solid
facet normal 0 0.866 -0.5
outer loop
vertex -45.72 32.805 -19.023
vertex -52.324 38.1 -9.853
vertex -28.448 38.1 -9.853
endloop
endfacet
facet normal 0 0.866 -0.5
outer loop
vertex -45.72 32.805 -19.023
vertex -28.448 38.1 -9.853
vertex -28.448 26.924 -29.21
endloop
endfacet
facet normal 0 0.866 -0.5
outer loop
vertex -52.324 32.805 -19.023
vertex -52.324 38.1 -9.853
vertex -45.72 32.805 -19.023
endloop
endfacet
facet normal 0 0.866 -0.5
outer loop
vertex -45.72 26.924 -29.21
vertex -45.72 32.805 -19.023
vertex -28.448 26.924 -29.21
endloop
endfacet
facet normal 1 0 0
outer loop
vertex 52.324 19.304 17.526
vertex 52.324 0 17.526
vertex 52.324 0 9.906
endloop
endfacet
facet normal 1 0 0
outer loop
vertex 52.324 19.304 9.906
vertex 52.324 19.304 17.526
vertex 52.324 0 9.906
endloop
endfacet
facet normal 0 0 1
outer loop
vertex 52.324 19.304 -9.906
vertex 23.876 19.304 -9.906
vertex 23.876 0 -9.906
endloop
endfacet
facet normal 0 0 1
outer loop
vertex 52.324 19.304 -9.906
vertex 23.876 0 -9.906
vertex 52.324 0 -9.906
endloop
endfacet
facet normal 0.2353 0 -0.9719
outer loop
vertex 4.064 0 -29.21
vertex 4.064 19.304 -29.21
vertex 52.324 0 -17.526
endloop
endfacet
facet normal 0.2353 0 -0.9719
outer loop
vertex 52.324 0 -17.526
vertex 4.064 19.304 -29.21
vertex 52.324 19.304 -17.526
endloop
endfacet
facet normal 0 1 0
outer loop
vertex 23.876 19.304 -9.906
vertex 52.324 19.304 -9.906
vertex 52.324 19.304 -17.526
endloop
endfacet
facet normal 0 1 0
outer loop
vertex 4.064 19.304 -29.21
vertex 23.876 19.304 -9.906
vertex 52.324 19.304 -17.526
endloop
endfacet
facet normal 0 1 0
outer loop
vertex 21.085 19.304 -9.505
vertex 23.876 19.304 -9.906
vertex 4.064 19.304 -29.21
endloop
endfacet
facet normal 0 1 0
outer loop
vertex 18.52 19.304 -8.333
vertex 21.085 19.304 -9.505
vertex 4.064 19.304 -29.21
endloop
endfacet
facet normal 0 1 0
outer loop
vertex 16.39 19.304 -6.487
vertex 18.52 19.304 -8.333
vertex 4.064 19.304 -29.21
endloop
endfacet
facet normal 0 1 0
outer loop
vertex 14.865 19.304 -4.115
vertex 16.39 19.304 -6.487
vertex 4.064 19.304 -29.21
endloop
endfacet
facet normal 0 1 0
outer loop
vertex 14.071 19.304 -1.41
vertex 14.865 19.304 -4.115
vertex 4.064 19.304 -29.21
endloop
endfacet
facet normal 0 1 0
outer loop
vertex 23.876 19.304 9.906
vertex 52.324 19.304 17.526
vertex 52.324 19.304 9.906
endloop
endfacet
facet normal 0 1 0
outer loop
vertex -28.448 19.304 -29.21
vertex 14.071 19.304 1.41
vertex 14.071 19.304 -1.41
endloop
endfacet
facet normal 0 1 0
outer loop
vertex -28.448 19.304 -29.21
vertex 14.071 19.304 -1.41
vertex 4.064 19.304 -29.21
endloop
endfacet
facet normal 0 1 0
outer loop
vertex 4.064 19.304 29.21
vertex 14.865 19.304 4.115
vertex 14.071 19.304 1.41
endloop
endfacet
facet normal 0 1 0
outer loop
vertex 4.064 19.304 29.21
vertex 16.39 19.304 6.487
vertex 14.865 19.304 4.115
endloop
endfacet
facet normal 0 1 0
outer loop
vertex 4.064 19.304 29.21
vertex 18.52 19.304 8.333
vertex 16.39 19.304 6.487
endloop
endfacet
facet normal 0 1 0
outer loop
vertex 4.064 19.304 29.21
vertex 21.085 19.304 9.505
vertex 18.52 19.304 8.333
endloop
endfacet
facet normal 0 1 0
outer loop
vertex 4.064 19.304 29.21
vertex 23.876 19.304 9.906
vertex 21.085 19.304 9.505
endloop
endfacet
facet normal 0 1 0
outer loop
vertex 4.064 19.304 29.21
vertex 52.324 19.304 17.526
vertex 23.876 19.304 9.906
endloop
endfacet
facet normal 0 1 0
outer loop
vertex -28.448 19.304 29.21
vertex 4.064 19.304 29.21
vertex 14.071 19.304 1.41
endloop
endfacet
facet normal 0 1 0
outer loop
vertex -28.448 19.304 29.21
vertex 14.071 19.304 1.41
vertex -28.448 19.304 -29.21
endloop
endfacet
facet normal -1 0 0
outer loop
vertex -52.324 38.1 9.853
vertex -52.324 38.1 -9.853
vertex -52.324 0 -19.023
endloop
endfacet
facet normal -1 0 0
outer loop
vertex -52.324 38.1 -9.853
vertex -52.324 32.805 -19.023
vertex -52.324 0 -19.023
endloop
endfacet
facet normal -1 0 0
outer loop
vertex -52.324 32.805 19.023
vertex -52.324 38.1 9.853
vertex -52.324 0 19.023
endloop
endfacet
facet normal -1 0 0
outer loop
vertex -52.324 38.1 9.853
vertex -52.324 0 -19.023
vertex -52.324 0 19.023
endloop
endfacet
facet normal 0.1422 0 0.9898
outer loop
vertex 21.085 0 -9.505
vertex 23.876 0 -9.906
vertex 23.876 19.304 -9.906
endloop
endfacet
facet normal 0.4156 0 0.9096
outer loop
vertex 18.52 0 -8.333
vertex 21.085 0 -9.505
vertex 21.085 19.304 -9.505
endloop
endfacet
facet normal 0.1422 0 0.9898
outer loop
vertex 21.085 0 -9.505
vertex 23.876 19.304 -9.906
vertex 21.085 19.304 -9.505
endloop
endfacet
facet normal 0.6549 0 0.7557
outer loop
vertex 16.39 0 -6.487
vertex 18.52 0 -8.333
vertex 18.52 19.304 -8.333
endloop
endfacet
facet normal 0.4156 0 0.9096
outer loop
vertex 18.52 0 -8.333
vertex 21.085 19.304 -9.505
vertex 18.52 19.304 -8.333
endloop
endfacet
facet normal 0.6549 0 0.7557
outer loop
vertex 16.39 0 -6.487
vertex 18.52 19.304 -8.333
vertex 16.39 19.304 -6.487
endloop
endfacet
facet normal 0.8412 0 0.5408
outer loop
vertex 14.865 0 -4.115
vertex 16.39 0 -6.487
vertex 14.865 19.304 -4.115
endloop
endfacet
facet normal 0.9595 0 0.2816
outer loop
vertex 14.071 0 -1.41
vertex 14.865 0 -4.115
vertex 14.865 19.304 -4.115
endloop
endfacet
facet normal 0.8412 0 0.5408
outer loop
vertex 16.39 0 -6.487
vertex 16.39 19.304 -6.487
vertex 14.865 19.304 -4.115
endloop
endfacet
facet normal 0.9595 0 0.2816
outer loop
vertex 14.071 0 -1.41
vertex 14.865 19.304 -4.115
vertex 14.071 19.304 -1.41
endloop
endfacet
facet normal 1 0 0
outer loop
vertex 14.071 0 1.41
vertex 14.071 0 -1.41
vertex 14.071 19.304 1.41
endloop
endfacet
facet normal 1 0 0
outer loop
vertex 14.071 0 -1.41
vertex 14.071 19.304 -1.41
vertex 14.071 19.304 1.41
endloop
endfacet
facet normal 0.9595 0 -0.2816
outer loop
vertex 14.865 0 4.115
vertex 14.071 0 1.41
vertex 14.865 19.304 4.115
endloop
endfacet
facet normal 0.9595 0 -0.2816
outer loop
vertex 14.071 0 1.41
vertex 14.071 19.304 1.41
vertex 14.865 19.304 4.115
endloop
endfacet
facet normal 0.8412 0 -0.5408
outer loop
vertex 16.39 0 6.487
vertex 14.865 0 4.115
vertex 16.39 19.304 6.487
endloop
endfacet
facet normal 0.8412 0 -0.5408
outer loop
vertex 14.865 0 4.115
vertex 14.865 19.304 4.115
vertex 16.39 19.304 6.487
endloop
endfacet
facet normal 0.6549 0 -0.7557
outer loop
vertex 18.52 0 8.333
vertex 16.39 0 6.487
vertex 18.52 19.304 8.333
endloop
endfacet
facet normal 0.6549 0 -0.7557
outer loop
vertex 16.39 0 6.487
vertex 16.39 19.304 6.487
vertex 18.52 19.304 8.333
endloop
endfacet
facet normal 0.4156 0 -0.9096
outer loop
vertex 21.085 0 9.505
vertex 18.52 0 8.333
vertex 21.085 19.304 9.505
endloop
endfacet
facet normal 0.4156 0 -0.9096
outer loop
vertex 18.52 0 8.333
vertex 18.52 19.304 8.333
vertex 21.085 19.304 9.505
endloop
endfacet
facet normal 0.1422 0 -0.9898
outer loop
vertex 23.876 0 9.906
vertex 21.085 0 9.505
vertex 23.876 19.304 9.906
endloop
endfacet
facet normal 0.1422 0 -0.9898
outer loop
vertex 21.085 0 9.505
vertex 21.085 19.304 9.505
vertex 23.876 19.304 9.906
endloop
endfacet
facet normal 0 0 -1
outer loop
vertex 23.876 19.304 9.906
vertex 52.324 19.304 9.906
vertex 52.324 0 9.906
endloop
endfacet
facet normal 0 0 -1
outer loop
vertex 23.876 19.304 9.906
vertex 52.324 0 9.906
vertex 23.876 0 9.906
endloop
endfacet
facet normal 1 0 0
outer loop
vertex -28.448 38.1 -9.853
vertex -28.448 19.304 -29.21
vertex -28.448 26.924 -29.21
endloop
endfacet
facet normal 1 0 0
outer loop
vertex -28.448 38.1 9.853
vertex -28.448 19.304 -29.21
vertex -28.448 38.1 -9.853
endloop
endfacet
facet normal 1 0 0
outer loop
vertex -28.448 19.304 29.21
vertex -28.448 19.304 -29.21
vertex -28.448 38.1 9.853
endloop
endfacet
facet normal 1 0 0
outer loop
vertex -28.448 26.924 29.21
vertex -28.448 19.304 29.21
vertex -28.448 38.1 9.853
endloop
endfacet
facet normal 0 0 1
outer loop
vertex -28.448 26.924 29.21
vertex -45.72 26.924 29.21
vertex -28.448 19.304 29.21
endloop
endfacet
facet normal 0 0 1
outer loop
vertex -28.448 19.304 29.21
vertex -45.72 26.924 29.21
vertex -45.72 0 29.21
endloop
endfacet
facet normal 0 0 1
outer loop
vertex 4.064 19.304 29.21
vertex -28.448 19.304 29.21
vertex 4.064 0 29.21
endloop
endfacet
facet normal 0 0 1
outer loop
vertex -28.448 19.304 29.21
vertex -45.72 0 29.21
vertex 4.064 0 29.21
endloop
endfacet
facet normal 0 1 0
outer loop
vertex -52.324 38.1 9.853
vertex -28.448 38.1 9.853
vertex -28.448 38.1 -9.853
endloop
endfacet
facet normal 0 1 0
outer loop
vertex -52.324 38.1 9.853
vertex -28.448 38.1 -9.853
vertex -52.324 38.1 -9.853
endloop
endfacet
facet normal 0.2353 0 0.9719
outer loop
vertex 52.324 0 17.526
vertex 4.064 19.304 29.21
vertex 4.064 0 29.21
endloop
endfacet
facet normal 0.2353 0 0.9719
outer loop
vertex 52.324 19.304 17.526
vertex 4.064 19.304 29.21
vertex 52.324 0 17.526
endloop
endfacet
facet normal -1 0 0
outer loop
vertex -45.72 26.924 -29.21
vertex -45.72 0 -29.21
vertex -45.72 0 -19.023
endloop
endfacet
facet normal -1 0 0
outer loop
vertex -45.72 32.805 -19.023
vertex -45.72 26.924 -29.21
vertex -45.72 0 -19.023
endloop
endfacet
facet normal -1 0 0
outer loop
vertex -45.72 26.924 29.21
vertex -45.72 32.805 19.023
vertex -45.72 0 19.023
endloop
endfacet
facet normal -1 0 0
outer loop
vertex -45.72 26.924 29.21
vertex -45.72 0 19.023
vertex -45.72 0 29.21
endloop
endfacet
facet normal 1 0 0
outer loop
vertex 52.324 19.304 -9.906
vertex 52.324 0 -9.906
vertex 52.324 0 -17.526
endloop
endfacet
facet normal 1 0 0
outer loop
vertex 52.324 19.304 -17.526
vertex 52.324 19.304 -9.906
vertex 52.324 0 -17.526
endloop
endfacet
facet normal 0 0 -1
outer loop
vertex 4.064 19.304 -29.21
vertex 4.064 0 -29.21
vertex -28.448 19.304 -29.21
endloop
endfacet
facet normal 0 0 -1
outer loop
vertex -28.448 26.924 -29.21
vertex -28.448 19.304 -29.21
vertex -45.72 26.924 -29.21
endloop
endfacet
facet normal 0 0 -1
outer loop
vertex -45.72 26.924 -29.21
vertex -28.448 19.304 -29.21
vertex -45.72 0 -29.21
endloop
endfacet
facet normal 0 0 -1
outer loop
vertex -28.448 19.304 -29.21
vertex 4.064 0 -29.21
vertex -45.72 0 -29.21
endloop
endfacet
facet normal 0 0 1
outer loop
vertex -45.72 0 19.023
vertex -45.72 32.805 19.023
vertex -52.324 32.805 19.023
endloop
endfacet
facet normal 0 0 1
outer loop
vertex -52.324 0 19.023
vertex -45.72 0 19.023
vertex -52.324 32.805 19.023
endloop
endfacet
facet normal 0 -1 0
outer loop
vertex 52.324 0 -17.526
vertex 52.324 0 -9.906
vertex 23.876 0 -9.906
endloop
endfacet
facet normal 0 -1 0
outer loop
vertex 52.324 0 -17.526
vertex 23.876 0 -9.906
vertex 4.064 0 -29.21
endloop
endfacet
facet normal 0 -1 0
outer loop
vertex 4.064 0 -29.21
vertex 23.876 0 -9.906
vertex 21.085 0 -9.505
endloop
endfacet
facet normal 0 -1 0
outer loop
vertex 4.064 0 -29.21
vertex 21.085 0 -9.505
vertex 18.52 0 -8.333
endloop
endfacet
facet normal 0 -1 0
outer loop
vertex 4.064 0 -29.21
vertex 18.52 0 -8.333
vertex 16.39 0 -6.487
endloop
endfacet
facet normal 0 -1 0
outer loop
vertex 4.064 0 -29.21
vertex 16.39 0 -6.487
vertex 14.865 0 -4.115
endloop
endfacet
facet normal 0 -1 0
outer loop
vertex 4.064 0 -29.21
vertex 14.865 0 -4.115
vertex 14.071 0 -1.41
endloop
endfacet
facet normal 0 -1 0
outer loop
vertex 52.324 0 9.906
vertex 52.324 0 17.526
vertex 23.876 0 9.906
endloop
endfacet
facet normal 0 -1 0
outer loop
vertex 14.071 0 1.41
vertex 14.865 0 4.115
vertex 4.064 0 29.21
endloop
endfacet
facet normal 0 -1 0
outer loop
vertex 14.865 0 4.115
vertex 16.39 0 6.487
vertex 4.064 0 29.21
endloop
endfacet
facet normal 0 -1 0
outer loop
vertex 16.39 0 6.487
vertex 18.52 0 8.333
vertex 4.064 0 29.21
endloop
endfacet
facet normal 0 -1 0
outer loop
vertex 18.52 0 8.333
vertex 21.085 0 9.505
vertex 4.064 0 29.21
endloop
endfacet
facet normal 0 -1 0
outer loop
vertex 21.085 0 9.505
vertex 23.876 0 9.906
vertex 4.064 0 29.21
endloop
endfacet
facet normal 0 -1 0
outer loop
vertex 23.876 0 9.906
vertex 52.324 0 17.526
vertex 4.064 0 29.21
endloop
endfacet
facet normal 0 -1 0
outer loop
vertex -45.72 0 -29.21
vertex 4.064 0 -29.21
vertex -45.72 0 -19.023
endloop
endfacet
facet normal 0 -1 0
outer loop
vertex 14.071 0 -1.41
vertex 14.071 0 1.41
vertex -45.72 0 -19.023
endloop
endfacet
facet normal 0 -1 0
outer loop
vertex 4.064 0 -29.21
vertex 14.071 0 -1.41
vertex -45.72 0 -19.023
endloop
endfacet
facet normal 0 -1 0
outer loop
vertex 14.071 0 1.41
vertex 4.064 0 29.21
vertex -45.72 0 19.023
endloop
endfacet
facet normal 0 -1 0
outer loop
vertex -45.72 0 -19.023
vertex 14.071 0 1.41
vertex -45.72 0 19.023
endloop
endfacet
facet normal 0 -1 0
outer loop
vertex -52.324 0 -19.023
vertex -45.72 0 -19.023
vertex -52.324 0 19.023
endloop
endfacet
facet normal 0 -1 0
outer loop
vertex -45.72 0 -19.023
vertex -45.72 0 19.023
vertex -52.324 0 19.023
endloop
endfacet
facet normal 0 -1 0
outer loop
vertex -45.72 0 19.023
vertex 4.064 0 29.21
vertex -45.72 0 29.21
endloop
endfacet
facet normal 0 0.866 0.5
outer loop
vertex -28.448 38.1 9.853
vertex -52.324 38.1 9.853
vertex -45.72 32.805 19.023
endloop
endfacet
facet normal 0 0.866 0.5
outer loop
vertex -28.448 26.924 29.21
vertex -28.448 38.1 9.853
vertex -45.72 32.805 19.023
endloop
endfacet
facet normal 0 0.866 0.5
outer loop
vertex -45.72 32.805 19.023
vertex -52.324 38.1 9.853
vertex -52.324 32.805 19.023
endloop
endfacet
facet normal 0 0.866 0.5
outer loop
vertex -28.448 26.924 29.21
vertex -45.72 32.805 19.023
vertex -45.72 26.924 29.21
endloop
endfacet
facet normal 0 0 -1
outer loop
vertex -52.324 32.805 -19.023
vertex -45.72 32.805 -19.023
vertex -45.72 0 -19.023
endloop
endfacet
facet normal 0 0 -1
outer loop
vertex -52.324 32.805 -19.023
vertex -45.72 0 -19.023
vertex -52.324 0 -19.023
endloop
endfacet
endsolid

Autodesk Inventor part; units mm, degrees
ref_plane "YZ Plane" through (0, 0, 0) normal (1, 0, 0) x (0, 1, 0)
ref_plane "XZ Plane" through (0, 0, 0) normal (0, 1, 0) x (-1, 0, 0)
ref_plane "XY Plane" through (0, 0, 0) normal (0, 0, 1) x (1, 0, 0)
sketch "Sketch1" plane through (0, 0, 0) normal (0, 1, 0) x (-1, 0, 0)
  line L0 (-52.324, -29.21) -> (52.324, -29.21)
  line L1 (52.324, -29.21) -> (52.324, 29.21)
  line L2 (52.324, 29.21) -> (-52.324, 29.21)
  line L3 (-52.324, 29.21) -> (-52.324, -29.21)
  line L4 (-52.324, -29.21) -> (52.324, 29.21) construction
  line L5 (52.324, -29.21) -> (-52.324, 29.21) construction
  point P0 (0, 0)
  dimension "d0" = 104.648
  dimension "d1" = 58.42
extrude "Extrusion1" add sketch "Sketch1" along normal blind 38.1
sketch "Sketch2" plane through (-52.324, 0, 29.21) normal (0, 0, 1) x (1, 0, 0)
  line L0 (0, 38.1) -> (104.648, 38.1) projected
  line L1 (104.648, 0) -> (104.648, 38.1) projected
  line L2 (23.876, 38.1) -> (104.648, 38.1)
  line L3 (104.648, 38.1) -> (104.648, 19.304)
  line L4 (104.648, 19.304) -> (23.876, 19.304)
  line L5 (23.876, 19.304) -> (23.876, 38.1)
  line L6 (0, 0) -> (0, 38.1) projected
  line L7 (0, 0) -> (104.648, 0) projected
  point P0 (52.324, 0)
  dimension "d4" = 23.876
  dimension "d5" = 19.304
extrude "Extrusion2" cut sketch "Sketch2" against normal through all contours L0 L1 L4 L5
sketch "Sketch3" plane through (-52.324, 0, -29.21) normal (-1, 0, 0) x (0, 0, 1)
  line L0 (0, 38.1) -> (58.42, 38.1) projected
  line L1 (39.0626, 38.1) -> (58.42, 26.924)
  line L2 (58.42, 0) -> (58.42, 38.1) projected
  point P0 (29.21, 0)
  dimension "d8" = 11.176
  dimension "d9" = 30
extrude "Extrusion3" cut sketch "Sketch3" against normal through all
sketch "Sketch4" plane through (-52.324, 0, -29.21) normal (-1, 0, 0) x (0, 0, 1)
  line L0 (0, 38.1) -> (39.0626, 38.1) projected
  line L1 (19.3574, 38.1) -> (0, 26.924)
  line L2 (0, 38.1) -> (0, 19.304) projected
  point P0 (29.21, 0)
  dimension "d12" = 11.176
  dimension "d13" = 30
extrude "Extrusion4" cut sketch "Sketch4" against normal through all
sketch "Sketch5" plane through (-28.448, 19.304, 29.21) normal (0, 1, 0) x (1, 0, 0)
  line L0 (80.772, 0) -> (0, 0) projected
  line L1 (32.512, 0) -> (80.772, 11.684)
  line L2 (80.772, 58.42) -> (80.772, 0) projected
  point P0 (28.448, 29.21)
  dimension "d16" = 48.26
  dimension "d17" = 11.684
extrude "Extrusion5" cut sketch "Sketch5" against normal through all
sketch "Sketch6" plane through (-28.448, 19.304, -29.21) normal (0, 1, 0) x (1, 0, 0)
  line L0 (80.772, 0) -> (-23.876, 0) projected
  line L1 (32.512, 0) -> (80.772, -11.684)
  line L2 (80.772, 0) -> (80.772, -46.736) projected
  point P0 (28.448, -29.21)
  dimension "d20" = 11.684
  dimension "d21" = 48.26
extrude "Extrusion6" cut sketch "Sketch6" against normal through all
sketch "Sketch7" plane through (0, 0, 0) normal (0, -1, 0) x (1, 0, 0)
  line L0 (-52.324, 29.21) -> (-52.324, 9.8526) projected
  line L1 (-52.324, 19.5313) -> (-45.72, 19.5313)
  line L2 (-45.72, 19.5313) -> (-45.72, 29.6913)
  line L3 (-45.72, 29.6913) -> (-52.324, 29.6913)
  line L4 (-52.324, 29.6913) -> (-52.324, 19.5313)
  point P0 (0, 0)
  dimension "d25" = 6.604
  dimension "d26" = 10.16
extrude "Extrusion7" cut sketch "Sketch7" against normal through all
sketch "Sketch8" plane through (0, 0, 0) normal (0, -1, 0) x (1, 0, 0)
  line L0 (-52.324, -9.8526) -> (-52.324, -29.21) projected
  line L1 (-52.324, -19.5313) -> (-45.72, -19.5313)
  line L2 (-45.72, -19.5313) -> (-45.72, -29.6913)
  line L3 (-45.72, -29.6913) -> (-52.324, -29.6913)
  line L4 (-52.324, -29.6913) -> (-52.324, -19.5313)
  point P0 (0, 0)
  dimension "d29" = 6.604
  dimension "d30" = 10.16
extrude "Extrusion8" cut sketch "Sketch8" against normal through all
sketch "Sketch9" plane through (-28.448, 19.304, 29.21) normal (0, 1, 0) x (1, 0, 0)
  line L0 (80.772, 46.736) -> (80.772, 11.684) projected
  circle A0 centre (52.324, 29.21) radius 9.906
  point P0 (28.448, 29.21)
  point P1 (80.772, 29.21)
  point P2 (80.772, 29.21)
  dimension "d35" = 19.812
  dimension "d36" = 28.448
extrude "Extrusion9" cut sketch "Sketch9" against normal through all
sketch "Sketch10" plane through (-28.448, 19.304, 29.21) normal (0, 1, 0) x (1, 0, 0)
  circle A0 centre (52.324, 29.21) radius 9.906 projected
  line L0 (80.772, 11.684) -> (80.772, 46.736) projected
  line L1 (52.324, 39.116) -> (80.772, 39.116)
  line L2 (80.772, 39.116) -> (80.772, 19.304)
  line L3 (80.772, 19.304) -> (52.324, 19.304)
  line L4 (52.324, 19.304) -> (52.324, 39.116)
  point P0 (28.448, 29.21)
  dimension "d39" = 19.812
extrude "Extrusion10" cut sketch "Sketch10" against normal through all contours A0 L1 L0 L3
sketch "Sketch11" plane through (0, 0, 0) normal (0, -1, 0) x (1, 0, 0)
  line L0 (-52.324, -19.5313) -> (-52.324, 19.5313) projected
  line L1 (-52.324, -19.5313) -> (-45.72, -19.5313)
  line L2 (-45.72, -19.5313) -> (-45.72, -19.0233)
  line L3 (-45.72, -19.0233) -> (-52.324, -19.0233)
  line L4 (-52.324, -19.0233) -> (-52.324, -19.5313)
  point P0 (0, 0)
  dimension "d42" = 0.508
sketch "Sketch12" plane through (0, 0, 0) normal (0, -1, 0) x (1, 0, 0)
  line L0 (-52.324, -19.5313) -> (-52.324, 19.5313) projected
  line L1 (-52.324, 19.5313) -> (-45.72, 19.5313)
  line L2 (-45.72, 19.5313) -> (-45.72, 19.0233)
  line L3 (-45.72, 19.0233) -> (-52.324, 19.0233)
  line L4 (-52.324, 19.0233) -> (-52.324, 19.5313)
  point P0 (0, 0)
  dimension "d43" = 0.508
extrude "Extrusion11" cut sketch "Sketch11" against normal through all
extrude "Extrusion12" cut sketch "Sketch12" against normal through all
properties part number "FINGER GUIDE"
